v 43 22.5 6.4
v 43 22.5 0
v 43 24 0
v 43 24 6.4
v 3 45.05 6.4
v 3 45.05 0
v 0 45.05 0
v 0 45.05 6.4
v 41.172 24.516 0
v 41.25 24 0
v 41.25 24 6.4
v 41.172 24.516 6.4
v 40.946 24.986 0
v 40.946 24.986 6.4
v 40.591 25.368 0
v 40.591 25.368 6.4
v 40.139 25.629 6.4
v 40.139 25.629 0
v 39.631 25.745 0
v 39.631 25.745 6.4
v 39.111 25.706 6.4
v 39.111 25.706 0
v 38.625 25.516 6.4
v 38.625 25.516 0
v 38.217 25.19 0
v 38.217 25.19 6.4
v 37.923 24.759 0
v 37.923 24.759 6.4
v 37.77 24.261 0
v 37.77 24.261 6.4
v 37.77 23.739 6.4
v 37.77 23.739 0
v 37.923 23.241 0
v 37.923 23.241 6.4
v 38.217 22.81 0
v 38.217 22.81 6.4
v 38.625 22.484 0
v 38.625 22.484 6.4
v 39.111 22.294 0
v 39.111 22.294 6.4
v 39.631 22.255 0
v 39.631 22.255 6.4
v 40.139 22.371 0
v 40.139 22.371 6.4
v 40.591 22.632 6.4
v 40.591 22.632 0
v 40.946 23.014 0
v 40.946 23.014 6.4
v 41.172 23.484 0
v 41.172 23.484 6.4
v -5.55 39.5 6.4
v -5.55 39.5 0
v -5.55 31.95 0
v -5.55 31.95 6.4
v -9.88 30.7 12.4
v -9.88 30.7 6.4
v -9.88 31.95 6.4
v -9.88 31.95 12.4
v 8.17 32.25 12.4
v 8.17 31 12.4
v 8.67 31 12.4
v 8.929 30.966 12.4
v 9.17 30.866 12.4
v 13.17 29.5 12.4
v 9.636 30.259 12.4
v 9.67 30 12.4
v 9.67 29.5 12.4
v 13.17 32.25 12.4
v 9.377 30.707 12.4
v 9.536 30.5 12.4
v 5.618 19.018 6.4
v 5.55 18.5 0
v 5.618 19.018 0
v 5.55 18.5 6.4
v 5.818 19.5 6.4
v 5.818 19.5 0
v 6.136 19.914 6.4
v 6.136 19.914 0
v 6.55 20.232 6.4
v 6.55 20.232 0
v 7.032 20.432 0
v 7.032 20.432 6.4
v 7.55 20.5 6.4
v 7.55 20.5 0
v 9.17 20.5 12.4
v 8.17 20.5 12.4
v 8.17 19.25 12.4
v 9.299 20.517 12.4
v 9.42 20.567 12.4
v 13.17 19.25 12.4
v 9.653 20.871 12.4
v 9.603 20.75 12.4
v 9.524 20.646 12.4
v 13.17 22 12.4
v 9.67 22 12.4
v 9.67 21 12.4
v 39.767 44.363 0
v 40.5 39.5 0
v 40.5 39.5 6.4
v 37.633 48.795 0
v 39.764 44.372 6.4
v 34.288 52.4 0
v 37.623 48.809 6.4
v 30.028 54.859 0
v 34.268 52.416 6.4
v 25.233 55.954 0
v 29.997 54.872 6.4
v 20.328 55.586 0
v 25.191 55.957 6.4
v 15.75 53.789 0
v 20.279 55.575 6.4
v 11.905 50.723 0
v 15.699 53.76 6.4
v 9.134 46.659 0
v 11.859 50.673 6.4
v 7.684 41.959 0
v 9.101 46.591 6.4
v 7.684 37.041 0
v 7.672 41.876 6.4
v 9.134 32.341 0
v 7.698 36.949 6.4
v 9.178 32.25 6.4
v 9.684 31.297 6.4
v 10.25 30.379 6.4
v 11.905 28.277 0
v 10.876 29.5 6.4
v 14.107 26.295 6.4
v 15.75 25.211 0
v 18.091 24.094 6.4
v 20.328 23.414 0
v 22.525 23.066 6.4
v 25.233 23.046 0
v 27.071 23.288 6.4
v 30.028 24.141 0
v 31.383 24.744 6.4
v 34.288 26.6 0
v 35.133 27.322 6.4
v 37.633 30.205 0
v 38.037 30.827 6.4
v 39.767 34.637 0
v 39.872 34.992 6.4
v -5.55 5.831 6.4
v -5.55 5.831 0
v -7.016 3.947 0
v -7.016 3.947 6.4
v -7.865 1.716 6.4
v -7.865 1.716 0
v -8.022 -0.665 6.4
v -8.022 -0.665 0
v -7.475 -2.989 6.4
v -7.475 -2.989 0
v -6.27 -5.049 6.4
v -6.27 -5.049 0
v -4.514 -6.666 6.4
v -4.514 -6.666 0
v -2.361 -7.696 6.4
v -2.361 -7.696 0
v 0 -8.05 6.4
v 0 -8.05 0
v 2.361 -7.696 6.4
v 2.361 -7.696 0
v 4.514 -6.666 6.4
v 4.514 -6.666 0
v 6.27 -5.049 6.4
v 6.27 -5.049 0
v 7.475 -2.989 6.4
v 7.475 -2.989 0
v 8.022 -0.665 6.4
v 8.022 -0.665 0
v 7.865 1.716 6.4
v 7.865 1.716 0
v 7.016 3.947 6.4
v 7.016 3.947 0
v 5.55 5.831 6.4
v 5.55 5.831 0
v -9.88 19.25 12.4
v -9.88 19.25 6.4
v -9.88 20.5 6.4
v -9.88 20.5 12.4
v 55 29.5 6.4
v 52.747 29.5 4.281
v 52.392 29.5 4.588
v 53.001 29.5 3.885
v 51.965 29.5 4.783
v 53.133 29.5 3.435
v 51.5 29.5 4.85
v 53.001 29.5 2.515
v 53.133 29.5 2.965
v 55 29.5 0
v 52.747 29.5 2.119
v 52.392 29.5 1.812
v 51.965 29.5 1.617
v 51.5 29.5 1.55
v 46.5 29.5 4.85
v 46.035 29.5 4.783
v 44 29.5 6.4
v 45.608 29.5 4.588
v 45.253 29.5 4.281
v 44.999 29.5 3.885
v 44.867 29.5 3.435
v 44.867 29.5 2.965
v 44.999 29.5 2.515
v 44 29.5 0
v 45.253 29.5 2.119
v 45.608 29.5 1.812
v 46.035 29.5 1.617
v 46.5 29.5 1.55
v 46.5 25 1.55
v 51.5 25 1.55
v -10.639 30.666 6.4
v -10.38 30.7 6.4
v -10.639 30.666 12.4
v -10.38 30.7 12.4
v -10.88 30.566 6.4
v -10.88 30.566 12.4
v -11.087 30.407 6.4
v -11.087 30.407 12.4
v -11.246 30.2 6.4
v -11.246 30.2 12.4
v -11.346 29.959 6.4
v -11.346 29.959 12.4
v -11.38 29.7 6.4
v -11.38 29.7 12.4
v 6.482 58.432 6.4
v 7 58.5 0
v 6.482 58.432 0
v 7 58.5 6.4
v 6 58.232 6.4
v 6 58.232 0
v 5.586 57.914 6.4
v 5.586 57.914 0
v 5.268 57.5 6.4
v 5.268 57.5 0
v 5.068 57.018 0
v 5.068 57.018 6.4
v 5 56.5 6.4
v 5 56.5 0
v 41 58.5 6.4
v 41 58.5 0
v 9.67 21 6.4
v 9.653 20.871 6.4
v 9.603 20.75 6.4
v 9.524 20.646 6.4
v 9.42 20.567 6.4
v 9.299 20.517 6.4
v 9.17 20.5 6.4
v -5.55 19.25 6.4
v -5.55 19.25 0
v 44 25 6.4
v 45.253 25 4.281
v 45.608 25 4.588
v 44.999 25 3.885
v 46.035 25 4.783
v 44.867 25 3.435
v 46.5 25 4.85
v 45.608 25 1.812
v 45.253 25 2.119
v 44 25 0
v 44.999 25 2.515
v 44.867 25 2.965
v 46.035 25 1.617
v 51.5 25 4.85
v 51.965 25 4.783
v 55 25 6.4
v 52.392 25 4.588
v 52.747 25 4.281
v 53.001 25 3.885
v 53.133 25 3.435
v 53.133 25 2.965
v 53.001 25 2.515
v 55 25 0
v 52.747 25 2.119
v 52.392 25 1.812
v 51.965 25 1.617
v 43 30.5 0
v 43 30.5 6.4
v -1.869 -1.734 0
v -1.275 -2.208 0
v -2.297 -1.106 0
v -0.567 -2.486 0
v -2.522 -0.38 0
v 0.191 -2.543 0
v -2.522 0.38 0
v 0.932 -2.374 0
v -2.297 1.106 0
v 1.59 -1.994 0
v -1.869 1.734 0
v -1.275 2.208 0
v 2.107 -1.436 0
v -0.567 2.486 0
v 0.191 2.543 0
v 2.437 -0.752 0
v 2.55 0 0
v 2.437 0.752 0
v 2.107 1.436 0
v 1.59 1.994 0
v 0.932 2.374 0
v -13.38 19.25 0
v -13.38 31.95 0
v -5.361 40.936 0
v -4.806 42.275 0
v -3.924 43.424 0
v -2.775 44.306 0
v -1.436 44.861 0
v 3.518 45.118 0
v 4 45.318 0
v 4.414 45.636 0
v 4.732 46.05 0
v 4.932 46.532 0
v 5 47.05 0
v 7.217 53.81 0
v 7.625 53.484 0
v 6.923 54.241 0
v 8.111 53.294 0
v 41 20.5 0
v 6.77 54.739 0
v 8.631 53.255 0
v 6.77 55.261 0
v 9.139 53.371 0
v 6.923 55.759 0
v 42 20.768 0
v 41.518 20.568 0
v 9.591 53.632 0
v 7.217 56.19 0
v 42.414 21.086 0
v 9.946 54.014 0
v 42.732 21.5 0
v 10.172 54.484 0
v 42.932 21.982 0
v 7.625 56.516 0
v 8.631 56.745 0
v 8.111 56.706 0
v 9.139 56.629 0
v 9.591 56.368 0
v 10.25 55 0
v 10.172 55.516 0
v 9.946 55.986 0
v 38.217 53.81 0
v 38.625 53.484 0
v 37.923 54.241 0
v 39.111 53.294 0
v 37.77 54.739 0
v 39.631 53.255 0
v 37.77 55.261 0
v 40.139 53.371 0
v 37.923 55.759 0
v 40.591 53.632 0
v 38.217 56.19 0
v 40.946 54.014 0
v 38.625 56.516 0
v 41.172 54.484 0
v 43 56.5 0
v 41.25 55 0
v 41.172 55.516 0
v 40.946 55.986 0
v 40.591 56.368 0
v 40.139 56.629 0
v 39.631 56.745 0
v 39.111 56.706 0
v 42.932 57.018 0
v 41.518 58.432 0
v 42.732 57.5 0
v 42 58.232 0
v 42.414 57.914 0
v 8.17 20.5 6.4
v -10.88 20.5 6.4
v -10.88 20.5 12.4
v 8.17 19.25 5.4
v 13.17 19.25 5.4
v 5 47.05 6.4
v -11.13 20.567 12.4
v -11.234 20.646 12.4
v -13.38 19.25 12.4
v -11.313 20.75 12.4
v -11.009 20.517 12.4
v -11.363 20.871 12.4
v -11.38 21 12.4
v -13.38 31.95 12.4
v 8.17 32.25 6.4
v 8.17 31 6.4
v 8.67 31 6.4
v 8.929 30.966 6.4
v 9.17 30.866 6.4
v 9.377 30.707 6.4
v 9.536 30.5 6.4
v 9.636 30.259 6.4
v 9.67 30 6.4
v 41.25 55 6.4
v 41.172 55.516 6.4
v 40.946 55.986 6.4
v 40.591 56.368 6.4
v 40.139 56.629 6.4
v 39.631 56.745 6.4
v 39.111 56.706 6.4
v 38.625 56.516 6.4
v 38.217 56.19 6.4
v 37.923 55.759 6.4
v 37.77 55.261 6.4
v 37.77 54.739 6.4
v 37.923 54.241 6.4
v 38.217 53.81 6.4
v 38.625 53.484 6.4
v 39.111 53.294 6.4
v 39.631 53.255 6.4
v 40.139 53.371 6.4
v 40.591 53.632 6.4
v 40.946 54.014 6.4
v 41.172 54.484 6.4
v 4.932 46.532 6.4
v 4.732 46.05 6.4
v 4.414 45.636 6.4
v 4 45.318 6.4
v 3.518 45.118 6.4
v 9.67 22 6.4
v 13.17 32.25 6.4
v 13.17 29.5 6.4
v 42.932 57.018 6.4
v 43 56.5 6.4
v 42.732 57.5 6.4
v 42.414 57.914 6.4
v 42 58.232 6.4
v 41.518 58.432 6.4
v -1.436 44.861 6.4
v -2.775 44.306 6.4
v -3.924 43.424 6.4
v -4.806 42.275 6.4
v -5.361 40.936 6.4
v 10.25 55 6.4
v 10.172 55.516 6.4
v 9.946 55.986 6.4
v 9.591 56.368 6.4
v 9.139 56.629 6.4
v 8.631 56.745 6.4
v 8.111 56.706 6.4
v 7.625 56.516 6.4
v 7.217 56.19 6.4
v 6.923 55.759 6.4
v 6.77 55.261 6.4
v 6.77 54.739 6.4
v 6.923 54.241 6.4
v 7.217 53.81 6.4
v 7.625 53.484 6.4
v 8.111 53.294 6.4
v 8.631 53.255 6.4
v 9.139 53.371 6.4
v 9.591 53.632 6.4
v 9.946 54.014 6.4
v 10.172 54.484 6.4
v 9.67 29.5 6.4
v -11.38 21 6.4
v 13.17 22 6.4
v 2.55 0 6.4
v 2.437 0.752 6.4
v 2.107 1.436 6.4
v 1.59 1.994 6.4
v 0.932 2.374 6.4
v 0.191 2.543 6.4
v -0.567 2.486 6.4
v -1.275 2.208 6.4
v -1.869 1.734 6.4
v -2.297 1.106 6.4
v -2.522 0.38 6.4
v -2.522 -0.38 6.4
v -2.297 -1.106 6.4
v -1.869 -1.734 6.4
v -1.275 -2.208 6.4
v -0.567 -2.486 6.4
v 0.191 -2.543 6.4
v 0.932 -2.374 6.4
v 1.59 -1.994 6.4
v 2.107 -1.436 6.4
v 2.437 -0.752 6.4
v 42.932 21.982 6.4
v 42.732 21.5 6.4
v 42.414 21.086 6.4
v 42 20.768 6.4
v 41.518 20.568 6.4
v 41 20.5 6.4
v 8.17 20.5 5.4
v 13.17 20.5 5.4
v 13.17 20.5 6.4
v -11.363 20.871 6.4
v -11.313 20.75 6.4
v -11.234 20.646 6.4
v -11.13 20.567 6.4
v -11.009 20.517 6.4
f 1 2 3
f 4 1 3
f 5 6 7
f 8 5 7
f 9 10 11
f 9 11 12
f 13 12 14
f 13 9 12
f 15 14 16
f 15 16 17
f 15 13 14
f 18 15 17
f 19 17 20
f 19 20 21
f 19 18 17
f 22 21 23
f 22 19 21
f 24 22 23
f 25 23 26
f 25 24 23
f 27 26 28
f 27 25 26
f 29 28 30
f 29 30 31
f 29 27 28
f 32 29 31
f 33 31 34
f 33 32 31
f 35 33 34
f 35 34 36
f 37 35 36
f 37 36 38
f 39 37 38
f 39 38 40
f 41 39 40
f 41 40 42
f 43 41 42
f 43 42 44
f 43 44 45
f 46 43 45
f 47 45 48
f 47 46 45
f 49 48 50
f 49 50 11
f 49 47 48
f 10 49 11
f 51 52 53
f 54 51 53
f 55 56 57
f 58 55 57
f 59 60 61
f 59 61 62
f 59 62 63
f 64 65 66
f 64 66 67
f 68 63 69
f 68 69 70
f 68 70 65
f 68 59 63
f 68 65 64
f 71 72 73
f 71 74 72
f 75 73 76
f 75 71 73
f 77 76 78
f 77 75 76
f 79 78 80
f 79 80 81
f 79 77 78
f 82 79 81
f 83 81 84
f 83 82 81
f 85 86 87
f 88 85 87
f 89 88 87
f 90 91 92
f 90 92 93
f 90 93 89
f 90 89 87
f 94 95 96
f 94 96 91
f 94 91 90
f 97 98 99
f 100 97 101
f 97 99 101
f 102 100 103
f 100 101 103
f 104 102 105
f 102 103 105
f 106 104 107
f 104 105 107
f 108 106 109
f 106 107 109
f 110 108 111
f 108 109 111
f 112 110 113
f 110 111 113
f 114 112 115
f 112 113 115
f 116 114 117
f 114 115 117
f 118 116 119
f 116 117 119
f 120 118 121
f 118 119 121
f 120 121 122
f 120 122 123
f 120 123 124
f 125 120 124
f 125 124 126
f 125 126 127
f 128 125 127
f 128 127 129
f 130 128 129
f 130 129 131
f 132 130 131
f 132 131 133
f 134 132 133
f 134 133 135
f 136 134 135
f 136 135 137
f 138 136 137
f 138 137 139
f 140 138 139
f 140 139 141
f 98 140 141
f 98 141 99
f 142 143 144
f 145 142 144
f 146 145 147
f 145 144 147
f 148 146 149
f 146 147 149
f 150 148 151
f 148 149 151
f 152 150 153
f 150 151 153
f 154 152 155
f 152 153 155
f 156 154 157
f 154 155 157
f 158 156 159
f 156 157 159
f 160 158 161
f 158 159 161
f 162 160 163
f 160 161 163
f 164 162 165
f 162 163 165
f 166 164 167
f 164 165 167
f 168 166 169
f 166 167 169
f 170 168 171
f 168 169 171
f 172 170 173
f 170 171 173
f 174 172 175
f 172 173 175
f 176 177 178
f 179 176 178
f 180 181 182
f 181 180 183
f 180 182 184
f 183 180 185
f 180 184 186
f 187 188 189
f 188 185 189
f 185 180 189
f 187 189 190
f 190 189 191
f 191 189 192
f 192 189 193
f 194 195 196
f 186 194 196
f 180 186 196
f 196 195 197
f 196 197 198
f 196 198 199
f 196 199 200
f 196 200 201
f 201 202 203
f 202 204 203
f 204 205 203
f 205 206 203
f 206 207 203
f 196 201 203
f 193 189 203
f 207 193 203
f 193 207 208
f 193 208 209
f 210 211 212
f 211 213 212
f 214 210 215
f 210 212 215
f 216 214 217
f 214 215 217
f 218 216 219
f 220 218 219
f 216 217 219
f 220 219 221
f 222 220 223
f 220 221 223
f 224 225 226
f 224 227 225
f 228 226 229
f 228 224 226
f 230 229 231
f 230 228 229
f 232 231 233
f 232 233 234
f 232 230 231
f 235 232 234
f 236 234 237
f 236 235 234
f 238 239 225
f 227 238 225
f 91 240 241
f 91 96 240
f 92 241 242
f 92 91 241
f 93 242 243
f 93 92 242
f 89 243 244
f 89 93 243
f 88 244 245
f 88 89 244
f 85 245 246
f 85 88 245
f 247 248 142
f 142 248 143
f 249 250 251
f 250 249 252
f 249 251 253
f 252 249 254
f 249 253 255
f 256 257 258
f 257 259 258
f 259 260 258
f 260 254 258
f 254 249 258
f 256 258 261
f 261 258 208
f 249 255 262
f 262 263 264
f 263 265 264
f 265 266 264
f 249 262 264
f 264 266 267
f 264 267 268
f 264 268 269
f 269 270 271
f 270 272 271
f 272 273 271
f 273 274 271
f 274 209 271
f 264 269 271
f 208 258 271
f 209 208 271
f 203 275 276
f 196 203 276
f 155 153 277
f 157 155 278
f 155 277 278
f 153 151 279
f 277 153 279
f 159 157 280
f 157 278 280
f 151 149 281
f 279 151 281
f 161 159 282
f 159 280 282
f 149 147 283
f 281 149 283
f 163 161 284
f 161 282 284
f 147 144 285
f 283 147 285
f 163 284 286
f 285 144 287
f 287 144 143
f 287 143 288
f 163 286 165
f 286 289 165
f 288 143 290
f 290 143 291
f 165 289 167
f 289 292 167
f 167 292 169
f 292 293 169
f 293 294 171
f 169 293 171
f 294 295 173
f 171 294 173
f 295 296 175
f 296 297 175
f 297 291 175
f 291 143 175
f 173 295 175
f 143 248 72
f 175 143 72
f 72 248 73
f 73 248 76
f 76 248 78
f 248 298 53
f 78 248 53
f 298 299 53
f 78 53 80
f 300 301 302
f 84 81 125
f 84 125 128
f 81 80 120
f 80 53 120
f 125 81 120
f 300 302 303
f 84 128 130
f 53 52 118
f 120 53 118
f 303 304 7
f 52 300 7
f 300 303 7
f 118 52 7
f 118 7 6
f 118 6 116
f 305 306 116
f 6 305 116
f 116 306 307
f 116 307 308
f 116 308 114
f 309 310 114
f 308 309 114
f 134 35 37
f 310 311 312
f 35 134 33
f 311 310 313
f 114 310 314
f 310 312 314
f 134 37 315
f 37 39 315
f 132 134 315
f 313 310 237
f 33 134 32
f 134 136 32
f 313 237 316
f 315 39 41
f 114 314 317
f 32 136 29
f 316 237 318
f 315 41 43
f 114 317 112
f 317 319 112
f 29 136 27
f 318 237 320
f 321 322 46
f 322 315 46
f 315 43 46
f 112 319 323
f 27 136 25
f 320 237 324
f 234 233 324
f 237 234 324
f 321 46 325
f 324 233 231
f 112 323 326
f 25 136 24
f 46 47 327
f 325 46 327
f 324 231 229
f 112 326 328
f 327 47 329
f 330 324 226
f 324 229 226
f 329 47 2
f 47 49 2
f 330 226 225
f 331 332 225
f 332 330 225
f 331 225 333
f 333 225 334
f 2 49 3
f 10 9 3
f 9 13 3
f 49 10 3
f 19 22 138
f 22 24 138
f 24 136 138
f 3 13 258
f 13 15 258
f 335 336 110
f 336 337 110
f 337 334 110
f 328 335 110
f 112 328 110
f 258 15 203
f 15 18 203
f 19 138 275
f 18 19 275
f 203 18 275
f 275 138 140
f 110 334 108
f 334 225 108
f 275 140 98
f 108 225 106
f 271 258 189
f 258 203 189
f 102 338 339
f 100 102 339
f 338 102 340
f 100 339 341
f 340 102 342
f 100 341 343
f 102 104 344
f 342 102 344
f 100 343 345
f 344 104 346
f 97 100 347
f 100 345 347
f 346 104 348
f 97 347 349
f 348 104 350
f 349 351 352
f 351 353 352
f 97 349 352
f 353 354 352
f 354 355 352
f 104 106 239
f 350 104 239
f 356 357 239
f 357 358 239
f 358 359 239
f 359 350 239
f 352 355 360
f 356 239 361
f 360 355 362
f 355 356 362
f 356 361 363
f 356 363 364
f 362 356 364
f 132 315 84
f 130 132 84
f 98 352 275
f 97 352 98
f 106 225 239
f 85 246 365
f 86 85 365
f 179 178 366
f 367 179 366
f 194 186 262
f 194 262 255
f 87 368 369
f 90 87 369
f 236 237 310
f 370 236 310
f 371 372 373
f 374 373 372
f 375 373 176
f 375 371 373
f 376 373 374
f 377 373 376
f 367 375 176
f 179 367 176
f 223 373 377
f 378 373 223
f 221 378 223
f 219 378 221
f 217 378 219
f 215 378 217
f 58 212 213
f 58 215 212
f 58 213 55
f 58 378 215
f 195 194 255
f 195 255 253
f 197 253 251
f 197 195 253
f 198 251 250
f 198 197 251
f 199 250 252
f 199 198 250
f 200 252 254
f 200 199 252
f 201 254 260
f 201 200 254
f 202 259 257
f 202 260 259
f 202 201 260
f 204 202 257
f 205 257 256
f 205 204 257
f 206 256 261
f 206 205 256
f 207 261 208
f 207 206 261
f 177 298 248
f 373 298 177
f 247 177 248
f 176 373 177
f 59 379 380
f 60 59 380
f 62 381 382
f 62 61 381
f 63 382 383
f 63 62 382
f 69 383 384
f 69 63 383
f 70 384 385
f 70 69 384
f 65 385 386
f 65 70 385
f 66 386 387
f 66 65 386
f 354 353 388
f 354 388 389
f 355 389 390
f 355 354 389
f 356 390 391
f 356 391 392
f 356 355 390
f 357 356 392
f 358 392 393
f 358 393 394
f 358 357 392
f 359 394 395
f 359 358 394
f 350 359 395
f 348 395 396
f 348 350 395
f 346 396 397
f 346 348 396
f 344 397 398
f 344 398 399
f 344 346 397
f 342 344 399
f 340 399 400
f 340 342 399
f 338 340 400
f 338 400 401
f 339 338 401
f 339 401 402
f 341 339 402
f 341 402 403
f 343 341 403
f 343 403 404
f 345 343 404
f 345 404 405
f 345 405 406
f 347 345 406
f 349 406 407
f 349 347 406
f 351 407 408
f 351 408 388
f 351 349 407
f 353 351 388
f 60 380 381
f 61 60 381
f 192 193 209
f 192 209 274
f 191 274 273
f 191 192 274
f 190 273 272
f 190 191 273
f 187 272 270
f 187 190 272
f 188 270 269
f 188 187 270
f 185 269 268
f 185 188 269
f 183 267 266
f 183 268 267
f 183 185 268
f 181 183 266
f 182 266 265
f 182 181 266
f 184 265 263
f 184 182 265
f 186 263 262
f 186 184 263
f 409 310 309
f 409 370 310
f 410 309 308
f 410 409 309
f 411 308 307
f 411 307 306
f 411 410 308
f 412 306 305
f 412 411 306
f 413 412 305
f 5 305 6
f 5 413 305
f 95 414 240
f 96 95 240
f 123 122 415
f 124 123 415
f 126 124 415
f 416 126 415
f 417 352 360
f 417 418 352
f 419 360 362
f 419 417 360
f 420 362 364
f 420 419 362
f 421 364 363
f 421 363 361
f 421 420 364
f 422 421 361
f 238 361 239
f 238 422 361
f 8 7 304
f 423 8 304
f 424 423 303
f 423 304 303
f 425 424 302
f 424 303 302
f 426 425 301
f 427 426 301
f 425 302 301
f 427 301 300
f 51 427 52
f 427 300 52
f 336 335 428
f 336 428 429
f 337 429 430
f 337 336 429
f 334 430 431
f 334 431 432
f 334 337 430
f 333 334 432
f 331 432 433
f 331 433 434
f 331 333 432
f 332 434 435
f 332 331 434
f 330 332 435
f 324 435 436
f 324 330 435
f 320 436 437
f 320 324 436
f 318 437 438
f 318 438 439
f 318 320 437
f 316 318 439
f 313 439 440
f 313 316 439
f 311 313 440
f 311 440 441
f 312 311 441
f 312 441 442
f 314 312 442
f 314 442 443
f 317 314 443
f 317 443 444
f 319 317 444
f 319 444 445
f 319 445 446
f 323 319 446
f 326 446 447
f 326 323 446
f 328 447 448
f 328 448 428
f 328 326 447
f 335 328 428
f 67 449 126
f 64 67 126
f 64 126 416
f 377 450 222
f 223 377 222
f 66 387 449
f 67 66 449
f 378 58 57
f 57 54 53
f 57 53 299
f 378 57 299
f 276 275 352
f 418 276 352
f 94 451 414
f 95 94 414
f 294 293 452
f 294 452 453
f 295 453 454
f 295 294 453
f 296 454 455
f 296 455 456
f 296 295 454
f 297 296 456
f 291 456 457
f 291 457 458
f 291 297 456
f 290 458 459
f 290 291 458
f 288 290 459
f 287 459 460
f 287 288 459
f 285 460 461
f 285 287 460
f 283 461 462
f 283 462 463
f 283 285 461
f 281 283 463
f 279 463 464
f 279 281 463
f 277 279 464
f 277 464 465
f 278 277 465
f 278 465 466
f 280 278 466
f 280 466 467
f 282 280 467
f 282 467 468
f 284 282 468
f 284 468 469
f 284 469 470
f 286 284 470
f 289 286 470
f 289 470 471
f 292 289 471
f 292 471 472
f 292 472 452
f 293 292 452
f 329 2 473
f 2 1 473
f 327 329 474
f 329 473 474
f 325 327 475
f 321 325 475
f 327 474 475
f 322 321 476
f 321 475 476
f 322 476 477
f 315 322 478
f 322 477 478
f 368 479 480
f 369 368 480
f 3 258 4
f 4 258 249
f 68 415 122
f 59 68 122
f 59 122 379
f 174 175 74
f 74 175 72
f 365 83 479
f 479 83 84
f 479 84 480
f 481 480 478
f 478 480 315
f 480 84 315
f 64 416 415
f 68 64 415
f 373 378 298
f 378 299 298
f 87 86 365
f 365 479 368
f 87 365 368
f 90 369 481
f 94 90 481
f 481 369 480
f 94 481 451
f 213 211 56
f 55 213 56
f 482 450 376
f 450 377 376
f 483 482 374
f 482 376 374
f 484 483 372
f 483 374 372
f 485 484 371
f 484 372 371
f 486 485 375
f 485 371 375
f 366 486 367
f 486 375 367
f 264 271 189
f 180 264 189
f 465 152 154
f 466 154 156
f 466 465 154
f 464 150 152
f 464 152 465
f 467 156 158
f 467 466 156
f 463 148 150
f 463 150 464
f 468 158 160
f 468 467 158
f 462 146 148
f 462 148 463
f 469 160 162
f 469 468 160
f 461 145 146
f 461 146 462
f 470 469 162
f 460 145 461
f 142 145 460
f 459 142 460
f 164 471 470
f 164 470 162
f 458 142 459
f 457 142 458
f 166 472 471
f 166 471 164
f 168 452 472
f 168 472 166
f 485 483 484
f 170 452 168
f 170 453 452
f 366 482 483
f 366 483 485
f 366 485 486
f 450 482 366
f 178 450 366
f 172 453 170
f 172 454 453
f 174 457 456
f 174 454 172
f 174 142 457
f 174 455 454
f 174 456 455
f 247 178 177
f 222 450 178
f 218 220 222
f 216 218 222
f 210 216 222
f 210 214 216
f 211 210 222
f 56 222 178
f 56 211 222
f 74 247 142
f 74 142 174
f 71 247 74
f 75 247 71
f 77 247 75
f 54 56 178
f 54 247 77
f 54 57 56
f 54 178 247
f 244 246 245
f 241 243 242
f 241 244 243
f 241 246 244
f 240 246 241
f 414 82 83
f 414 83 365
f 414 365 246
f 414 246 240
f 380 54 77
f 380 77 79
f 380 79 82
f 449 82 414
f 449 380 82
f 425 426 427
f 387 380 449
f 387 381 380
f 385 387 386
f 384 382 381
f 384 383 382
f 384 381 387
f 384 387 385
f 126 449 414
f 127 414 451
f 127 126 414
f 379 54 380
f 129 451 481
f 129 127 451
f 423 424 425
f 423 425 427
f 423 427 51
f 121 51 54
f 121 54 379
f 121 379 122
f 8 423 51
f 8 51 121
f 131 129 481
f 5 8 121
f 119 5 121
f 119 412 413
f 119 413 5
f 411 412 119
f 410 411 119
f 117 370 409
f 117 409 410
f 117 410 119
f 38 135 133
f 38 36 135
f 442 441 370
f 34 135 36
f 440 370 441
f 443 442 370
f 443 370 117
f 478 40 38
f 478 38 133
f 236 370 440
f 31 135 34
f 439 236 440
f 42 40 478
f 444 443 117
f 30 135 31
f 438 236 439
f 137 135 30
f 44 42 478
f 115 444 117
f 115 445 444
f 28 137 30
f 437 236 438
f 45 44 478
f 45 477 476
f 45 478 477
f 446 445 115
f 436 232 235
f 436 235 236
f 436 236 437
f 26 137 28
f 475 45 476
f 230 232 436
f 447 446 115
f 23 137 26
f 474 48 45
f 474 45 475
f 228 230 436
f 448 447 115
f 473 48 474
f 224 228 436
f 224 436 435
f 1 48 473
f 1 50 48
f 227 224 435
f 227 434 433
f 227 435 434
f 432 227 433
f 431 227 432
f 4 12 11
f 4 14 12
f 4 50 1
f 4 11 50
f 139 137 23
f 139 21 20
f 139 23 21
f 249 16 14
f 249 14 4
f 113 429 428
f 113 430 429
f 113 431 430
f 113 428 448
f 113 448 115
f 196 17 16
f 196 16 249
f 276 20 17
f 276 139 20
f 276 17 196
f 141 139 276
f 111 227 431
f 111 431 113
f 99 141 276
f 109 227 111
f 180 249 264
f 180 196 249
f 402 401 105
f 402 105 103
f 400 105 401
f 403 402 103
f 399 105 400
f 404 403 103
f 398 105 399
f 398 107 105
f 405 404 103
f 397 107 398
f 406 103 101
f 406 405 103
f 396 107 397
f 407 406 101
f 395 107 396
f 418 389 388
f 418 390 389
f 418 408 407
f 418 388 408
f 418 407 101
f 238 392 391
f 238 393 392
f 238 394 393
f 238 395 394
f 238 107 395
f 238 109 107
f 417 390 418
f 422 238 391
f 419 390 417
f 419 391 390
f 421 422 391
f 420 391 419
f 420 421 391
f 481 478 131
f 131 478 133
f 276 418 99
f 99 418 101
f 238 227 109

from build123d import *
from OCP.BRepFilletAPI import BRepFilletAPI_MakeFillet

# Parameters (mm, degrees)
SKETCH1_R                 = 2.55
SKETCH1_R_2               = 1.75
SKETCH1_R_3               = 12.5
BOSS_EXTRUDE3_DEPTH       = 6.4
SKETCH1_5_R               = 2.55
BOSS_EXTRUDE2_DEPTH       = 1
CUT_EXTRUDE1_DEPTH        = 10
FILLET2_R                 = 2
CHAMFER2_SIZE             = 1
FILLET1_R                 = 2
SKETCH5_R                 = 16.5
CUT_EXTRUDE2_DEPTH        = 10
SKETCH6_W                 = 4.33
SKETCH6_H                 = 1.25
BOSS_EXTRUDE5_DEPTH       = 6.4
BOSS_EXTRUDE8_DEPTH       = 6
BOSS_EXTRUDE13_DEPTH      = 6
BOSS_EXTRUDE13_DEPTH_BACK = 1
FILLET3_R1                = 1
FILLET3_R2                = 0.5


with BuildPart() as part:
    # Sketch1 → Boss-Extrude3 (new body)
    with BuildSketch(Plane.XY):
        with BuildLine():
            ThreePointArc((-5.55, 5.830951895), (0, -8.05), (5.55, 5.830951895))
            Line((5.55, 5.830951895), (5.55, 20.5))
            Line((5.55, 20.5), (43, 20.5))
            Line((43, 20.5), (43, 25))
            Line((43, 25), (55, 25))
            Line((55, 25), (55, 29.5))
            Line((55, 29.5), (43, 29.5))
            Line((43, 29.5), (43, 58.5))
            Line((43, 58.5), (5, 58.5))
            Line((5, 58.5), (5, 45.05))
            Line((5, 45.05), (0, 45.05))
            ThreePointArc((0, 45.05), (-3.924442636, 43.424442636), (-5.55, 39.5))
            Line((-5.55, 39.5), (-5.55, 5.830951895))
        make_face()
        Circle(SKETCH1_R, mode=Mode.SUBTRACT)
        with Locations((39.5, 24)):
            Circle(SKETCH1_R_2, mode=Mode.SUBTRACT)
        with Locations((8.5, 55)):
            Circle(SKETCH1_R_2, mode=Mode.SUBTRACT)
        with Locations((24, 39.5)):
            Circle(SKETCH1_R_3, mode=Mode.SUBTRACT)
        with Locations((39.5, 55)):
            Circle(SKETCH1_R_2, mode=Mode.SUBTRACT)
    extrude(amount=BOSS_EXTRUDE3_DEPTH)

    # Sketch1<5> → Boss-Extrude2 (add)
    # profile 1 of 2: a face of its own
    with BuildSketch(Plane.XY):
        with BuildLine():
            Line((-5.55, 5.830951895), (-5.55, 0))
            ThreePointArc((-5.55, 0), (0, -5.55), (5.55, 0))
            Line((5.55, 0), (5.55, 5.830951895))
            ThreePointArc((5.55, 5.830951895), (0, 8.05), (-5.55, 5.830951895))
        make_face()
        Circle(SKETCH1_5_R, mode=Mode.SUBTRACT)
    # profile 2 of 2: a face of its own
    with BuildSketch(Plane.XY):
        with BuildLine():
            ThreePointArc((5.55, 0), (0, -5.55), (-5.55, 0))
            Line((-5.55, 0), (-5.55, 5.830951895))
            ThreePointArc((-5.55, 5.830951895), (-3.172144385, -7.398648525), (8.05, 0))
            ThreePointArc((8.05, 0), (7.398648525, 3.172144385), (5.55, 5.830951895))
            Line((5.55, 5.830951895), (5.55, 0))
        make_face()
    extrude(amount=BOSS_EXTRUDE2_DEPTH)

    # Sketch3 → Cut-Extrude1 (cut)
    with BuildSketch(Plane(origin=(0, 29.5, 0), x_dir=(1, 0, 0), z_dir=(0, 1, 0))):
        with BuildLine():
            Line((46.5, -1.55), (51.5, -1.55))
            ThreePointArc((51.5, -1.55), (53.15, -3.2), (51.5, -4.85))
            Line((51.5, -4.85), (46.5, -4.85))
            ThreePointArc((46.5, -4.85), (44.85, -3.2), (46.5, -1.55))
        make_face()
    extrude(amount=-CUT_EXTRUDE1_DEPTH, mode=Mode.SUBTRACT)

    # Fillet2
    fillet2_edges = [part.edges().sort_by_distance(p)[0] for p in [
        (5.55, 20.5, 3.2),
        (5, 45.05, 3.2),
    ]]
    fillet(fillet2_edges, radius=FILLET2_R)

    # Chamfer2
    chamfer2_edges = [part.edges().sort_by_distance(p)[0] for p in [
        (43, 29.5, 3.2),
        (43, 25, 3.2),
    ]]
    chamfer(chamfer2_edges, length=CHAMFER2_SIZE)

    # Fillet1
    fillet1_edges = [part.edges().sort_by_distance(p)[0] for p in [
        (43, 20.5, 3.2),
        (5, 58.5, 3.2),
        (43, 58.5, 3.2),
    ]]
    fillet(fillet1_edges, radius=FILLET1_R)

    # Sketch5 → Cut-Extrude2 (cut)
    with BuildSketch(Plane.XY.offset(6.4)):
        with Locations((24, 39.5)):
            Circle(SKETCH5_R)
    extrude(amount=-CUT_EXTRUDE2_DEPTH, mode=Mode.SUBTRACT)

    # Sketch6 → Boss-Extrude5 (add)
    with BuildSketch(Plane.XY.offset(6.4)):
        with Locations((-7.715, 31.325)):
            Rectangle(SKETCH6_W, SKETCH6_H)
        with BuildLine():
            Line((-5.55, 24.637668909), (-5.55, 30.45))
            Line((-5.55, 30.45), (-10.13, 30.45))
            ThreePointArc((-10.13, 30.45), (-10.837106781, 30.157106781), (-11.13, 29.45))
            Line((-11.13, 29.45), (-11.13, 21.25))
            ThreePointArc((-11.13, 21.25), (-10.983553391, 20.896446609), (-10.63, 20.75))
            Line((-10.63, 20.75), (-5.55, 20.75))
            Line((-5.55, 20.75), (-5.55, 21.862331091))
            ThreePointArc((-5.55, 21.862331091), (-7.525, 23.25), (-5.55, 24.637668909))
        make_face()
        with BuildLine():
            Line((-10.13, 30.45), (-5.55, 30.45))
            Line((-5.55, 30.45), (-5.55, 30.7))
            Line((-5.55, 30.7), (-9.88, 30.7))
            Line((-9.88, 30.7), (-11.38, 30.7))
            Line((-11.38, 30.7), (-11.38, 20.5))
            Line((-11.38, 20.5), (-9.88, 20.5))
            Line((-9.88, 20.5), (-5.55, 20.5))
            Line((-5.55, 20.5), (-5.55, 20.75))
            Line((-5.55, 20.75), (-10.63, 20.75))
            ThreePointArc((-10.63, 20.75), (-10.983553391, 20.896446609), (-11.13, 21.25))
            Line((-11.13, 21.25), (-11.13, 29.45))
            ThreePointArc((-11.13, 29.45), (-10.837106781, 30.157106781), (-10.13, 30.45))
        make_face()
        Polygon((-11.38, 30.7), (-9.88, 30.7), (-9.88, 31.95), (-13.38, 31.95), (-13.38, 19.25), (-9.88, 19.25), (-9.88, 20.5), (-11.38, 20.5), align=None)
        with Locations((-7.715, 19.875)):
            Rectangle(SKETCH6_W, SKETCH6_H)
        with BuildLine():
            Line((-5.55, 21.862331091), (-5.55, 24.637668909))
            ThreePointArc((-5.55, 24.637668909), (-7.525, 23.25), (-5.55, 21.862331091))
        make_face()
        with BuildLine():
            ThreePointArc((-4.575, 23.25), (-4.843118689, 24.09797553), (-5.55, 24.637668909))
            Line((-5.55, 24.637668909), (-5.55, 21.862331091))
            ThreePointArc((-5.55, 21.862331091), (-4.843118689, 22.40202447), (-4.575, 23.25))
        make_face()
    extrude(amount=-BOSS_EXTRUDE5_DEPTH)

    # Sketch6<4> → Boss-Extrude8 (add)
    with BuildSketch(Plane.XY.offset(6.4)):
        Polygon((-9.88, 30.7), (-9.88, 31.95), (-13.38, 31.95), (-13.38, 19.25), (-9.88, 19.25), (-9.88, 20.5), (-11.38, 20.5), (-11.38, 30.7), align=None)
        Polygon((8.17, 32.25), (8.17, 31), (9.67, 31), (9.67, 29.5), (13.17, 29.5), (13.17, 32.25), align=None)
    extrude(amount=BOSS_EXTRUDE8_DEPTH)

    # Sketch7 → Boss-Extrude13 (add, two sides: drawn at the far end of the back side and taken through both)
    with BuildSketch(Plane.XY.offset(6.4).offset(-BOSS_EXTRUDE13_DEPTH_BACK)):
        Polygon((9.67, 22), (9.67, 20.5), (8.17, 20.5), (8.17, 19.25), (13.17, 19.25), (13.17, 22), align=None)
    extrude(amount=BOSS_EXTRUDE13_DEPTH + BOSS_EXTRUDE13_DEPTH_BACK)

    # Fillet3: one fillet with a radius per group of edges: ONE call of the kernel's fillet builder (fillet() takes one radius for all edges)
    fillet3_edges_1 = [part.edges().sort_by_distance(p)[0] for p in [
        (-11.38, 30.7, 9.4),
        (9.67, 31, 9.4),
    ]]
    fillet3_edges_2 = [part.edges().sort_by_distance(p)[0] for p in [
        (9.67, 20.5, 9.4),
        (-11.38, 20.5, 9.4),
    ]]
    fillet3 = BRepFilletAPI_MakeFillet(part.part.solid().wrapped)
    for e in fillet3_edges_1:
        fillet3.Add(FILLET3_R1, e.wrapped)
    for e in fillet3_edges_2:
        fillet3.Add(FILLET3_R2, e.wrapped)
    add(Compound.cast(fillet3.Shape()), mode=Mode.REPLACE)


solid = part.part
